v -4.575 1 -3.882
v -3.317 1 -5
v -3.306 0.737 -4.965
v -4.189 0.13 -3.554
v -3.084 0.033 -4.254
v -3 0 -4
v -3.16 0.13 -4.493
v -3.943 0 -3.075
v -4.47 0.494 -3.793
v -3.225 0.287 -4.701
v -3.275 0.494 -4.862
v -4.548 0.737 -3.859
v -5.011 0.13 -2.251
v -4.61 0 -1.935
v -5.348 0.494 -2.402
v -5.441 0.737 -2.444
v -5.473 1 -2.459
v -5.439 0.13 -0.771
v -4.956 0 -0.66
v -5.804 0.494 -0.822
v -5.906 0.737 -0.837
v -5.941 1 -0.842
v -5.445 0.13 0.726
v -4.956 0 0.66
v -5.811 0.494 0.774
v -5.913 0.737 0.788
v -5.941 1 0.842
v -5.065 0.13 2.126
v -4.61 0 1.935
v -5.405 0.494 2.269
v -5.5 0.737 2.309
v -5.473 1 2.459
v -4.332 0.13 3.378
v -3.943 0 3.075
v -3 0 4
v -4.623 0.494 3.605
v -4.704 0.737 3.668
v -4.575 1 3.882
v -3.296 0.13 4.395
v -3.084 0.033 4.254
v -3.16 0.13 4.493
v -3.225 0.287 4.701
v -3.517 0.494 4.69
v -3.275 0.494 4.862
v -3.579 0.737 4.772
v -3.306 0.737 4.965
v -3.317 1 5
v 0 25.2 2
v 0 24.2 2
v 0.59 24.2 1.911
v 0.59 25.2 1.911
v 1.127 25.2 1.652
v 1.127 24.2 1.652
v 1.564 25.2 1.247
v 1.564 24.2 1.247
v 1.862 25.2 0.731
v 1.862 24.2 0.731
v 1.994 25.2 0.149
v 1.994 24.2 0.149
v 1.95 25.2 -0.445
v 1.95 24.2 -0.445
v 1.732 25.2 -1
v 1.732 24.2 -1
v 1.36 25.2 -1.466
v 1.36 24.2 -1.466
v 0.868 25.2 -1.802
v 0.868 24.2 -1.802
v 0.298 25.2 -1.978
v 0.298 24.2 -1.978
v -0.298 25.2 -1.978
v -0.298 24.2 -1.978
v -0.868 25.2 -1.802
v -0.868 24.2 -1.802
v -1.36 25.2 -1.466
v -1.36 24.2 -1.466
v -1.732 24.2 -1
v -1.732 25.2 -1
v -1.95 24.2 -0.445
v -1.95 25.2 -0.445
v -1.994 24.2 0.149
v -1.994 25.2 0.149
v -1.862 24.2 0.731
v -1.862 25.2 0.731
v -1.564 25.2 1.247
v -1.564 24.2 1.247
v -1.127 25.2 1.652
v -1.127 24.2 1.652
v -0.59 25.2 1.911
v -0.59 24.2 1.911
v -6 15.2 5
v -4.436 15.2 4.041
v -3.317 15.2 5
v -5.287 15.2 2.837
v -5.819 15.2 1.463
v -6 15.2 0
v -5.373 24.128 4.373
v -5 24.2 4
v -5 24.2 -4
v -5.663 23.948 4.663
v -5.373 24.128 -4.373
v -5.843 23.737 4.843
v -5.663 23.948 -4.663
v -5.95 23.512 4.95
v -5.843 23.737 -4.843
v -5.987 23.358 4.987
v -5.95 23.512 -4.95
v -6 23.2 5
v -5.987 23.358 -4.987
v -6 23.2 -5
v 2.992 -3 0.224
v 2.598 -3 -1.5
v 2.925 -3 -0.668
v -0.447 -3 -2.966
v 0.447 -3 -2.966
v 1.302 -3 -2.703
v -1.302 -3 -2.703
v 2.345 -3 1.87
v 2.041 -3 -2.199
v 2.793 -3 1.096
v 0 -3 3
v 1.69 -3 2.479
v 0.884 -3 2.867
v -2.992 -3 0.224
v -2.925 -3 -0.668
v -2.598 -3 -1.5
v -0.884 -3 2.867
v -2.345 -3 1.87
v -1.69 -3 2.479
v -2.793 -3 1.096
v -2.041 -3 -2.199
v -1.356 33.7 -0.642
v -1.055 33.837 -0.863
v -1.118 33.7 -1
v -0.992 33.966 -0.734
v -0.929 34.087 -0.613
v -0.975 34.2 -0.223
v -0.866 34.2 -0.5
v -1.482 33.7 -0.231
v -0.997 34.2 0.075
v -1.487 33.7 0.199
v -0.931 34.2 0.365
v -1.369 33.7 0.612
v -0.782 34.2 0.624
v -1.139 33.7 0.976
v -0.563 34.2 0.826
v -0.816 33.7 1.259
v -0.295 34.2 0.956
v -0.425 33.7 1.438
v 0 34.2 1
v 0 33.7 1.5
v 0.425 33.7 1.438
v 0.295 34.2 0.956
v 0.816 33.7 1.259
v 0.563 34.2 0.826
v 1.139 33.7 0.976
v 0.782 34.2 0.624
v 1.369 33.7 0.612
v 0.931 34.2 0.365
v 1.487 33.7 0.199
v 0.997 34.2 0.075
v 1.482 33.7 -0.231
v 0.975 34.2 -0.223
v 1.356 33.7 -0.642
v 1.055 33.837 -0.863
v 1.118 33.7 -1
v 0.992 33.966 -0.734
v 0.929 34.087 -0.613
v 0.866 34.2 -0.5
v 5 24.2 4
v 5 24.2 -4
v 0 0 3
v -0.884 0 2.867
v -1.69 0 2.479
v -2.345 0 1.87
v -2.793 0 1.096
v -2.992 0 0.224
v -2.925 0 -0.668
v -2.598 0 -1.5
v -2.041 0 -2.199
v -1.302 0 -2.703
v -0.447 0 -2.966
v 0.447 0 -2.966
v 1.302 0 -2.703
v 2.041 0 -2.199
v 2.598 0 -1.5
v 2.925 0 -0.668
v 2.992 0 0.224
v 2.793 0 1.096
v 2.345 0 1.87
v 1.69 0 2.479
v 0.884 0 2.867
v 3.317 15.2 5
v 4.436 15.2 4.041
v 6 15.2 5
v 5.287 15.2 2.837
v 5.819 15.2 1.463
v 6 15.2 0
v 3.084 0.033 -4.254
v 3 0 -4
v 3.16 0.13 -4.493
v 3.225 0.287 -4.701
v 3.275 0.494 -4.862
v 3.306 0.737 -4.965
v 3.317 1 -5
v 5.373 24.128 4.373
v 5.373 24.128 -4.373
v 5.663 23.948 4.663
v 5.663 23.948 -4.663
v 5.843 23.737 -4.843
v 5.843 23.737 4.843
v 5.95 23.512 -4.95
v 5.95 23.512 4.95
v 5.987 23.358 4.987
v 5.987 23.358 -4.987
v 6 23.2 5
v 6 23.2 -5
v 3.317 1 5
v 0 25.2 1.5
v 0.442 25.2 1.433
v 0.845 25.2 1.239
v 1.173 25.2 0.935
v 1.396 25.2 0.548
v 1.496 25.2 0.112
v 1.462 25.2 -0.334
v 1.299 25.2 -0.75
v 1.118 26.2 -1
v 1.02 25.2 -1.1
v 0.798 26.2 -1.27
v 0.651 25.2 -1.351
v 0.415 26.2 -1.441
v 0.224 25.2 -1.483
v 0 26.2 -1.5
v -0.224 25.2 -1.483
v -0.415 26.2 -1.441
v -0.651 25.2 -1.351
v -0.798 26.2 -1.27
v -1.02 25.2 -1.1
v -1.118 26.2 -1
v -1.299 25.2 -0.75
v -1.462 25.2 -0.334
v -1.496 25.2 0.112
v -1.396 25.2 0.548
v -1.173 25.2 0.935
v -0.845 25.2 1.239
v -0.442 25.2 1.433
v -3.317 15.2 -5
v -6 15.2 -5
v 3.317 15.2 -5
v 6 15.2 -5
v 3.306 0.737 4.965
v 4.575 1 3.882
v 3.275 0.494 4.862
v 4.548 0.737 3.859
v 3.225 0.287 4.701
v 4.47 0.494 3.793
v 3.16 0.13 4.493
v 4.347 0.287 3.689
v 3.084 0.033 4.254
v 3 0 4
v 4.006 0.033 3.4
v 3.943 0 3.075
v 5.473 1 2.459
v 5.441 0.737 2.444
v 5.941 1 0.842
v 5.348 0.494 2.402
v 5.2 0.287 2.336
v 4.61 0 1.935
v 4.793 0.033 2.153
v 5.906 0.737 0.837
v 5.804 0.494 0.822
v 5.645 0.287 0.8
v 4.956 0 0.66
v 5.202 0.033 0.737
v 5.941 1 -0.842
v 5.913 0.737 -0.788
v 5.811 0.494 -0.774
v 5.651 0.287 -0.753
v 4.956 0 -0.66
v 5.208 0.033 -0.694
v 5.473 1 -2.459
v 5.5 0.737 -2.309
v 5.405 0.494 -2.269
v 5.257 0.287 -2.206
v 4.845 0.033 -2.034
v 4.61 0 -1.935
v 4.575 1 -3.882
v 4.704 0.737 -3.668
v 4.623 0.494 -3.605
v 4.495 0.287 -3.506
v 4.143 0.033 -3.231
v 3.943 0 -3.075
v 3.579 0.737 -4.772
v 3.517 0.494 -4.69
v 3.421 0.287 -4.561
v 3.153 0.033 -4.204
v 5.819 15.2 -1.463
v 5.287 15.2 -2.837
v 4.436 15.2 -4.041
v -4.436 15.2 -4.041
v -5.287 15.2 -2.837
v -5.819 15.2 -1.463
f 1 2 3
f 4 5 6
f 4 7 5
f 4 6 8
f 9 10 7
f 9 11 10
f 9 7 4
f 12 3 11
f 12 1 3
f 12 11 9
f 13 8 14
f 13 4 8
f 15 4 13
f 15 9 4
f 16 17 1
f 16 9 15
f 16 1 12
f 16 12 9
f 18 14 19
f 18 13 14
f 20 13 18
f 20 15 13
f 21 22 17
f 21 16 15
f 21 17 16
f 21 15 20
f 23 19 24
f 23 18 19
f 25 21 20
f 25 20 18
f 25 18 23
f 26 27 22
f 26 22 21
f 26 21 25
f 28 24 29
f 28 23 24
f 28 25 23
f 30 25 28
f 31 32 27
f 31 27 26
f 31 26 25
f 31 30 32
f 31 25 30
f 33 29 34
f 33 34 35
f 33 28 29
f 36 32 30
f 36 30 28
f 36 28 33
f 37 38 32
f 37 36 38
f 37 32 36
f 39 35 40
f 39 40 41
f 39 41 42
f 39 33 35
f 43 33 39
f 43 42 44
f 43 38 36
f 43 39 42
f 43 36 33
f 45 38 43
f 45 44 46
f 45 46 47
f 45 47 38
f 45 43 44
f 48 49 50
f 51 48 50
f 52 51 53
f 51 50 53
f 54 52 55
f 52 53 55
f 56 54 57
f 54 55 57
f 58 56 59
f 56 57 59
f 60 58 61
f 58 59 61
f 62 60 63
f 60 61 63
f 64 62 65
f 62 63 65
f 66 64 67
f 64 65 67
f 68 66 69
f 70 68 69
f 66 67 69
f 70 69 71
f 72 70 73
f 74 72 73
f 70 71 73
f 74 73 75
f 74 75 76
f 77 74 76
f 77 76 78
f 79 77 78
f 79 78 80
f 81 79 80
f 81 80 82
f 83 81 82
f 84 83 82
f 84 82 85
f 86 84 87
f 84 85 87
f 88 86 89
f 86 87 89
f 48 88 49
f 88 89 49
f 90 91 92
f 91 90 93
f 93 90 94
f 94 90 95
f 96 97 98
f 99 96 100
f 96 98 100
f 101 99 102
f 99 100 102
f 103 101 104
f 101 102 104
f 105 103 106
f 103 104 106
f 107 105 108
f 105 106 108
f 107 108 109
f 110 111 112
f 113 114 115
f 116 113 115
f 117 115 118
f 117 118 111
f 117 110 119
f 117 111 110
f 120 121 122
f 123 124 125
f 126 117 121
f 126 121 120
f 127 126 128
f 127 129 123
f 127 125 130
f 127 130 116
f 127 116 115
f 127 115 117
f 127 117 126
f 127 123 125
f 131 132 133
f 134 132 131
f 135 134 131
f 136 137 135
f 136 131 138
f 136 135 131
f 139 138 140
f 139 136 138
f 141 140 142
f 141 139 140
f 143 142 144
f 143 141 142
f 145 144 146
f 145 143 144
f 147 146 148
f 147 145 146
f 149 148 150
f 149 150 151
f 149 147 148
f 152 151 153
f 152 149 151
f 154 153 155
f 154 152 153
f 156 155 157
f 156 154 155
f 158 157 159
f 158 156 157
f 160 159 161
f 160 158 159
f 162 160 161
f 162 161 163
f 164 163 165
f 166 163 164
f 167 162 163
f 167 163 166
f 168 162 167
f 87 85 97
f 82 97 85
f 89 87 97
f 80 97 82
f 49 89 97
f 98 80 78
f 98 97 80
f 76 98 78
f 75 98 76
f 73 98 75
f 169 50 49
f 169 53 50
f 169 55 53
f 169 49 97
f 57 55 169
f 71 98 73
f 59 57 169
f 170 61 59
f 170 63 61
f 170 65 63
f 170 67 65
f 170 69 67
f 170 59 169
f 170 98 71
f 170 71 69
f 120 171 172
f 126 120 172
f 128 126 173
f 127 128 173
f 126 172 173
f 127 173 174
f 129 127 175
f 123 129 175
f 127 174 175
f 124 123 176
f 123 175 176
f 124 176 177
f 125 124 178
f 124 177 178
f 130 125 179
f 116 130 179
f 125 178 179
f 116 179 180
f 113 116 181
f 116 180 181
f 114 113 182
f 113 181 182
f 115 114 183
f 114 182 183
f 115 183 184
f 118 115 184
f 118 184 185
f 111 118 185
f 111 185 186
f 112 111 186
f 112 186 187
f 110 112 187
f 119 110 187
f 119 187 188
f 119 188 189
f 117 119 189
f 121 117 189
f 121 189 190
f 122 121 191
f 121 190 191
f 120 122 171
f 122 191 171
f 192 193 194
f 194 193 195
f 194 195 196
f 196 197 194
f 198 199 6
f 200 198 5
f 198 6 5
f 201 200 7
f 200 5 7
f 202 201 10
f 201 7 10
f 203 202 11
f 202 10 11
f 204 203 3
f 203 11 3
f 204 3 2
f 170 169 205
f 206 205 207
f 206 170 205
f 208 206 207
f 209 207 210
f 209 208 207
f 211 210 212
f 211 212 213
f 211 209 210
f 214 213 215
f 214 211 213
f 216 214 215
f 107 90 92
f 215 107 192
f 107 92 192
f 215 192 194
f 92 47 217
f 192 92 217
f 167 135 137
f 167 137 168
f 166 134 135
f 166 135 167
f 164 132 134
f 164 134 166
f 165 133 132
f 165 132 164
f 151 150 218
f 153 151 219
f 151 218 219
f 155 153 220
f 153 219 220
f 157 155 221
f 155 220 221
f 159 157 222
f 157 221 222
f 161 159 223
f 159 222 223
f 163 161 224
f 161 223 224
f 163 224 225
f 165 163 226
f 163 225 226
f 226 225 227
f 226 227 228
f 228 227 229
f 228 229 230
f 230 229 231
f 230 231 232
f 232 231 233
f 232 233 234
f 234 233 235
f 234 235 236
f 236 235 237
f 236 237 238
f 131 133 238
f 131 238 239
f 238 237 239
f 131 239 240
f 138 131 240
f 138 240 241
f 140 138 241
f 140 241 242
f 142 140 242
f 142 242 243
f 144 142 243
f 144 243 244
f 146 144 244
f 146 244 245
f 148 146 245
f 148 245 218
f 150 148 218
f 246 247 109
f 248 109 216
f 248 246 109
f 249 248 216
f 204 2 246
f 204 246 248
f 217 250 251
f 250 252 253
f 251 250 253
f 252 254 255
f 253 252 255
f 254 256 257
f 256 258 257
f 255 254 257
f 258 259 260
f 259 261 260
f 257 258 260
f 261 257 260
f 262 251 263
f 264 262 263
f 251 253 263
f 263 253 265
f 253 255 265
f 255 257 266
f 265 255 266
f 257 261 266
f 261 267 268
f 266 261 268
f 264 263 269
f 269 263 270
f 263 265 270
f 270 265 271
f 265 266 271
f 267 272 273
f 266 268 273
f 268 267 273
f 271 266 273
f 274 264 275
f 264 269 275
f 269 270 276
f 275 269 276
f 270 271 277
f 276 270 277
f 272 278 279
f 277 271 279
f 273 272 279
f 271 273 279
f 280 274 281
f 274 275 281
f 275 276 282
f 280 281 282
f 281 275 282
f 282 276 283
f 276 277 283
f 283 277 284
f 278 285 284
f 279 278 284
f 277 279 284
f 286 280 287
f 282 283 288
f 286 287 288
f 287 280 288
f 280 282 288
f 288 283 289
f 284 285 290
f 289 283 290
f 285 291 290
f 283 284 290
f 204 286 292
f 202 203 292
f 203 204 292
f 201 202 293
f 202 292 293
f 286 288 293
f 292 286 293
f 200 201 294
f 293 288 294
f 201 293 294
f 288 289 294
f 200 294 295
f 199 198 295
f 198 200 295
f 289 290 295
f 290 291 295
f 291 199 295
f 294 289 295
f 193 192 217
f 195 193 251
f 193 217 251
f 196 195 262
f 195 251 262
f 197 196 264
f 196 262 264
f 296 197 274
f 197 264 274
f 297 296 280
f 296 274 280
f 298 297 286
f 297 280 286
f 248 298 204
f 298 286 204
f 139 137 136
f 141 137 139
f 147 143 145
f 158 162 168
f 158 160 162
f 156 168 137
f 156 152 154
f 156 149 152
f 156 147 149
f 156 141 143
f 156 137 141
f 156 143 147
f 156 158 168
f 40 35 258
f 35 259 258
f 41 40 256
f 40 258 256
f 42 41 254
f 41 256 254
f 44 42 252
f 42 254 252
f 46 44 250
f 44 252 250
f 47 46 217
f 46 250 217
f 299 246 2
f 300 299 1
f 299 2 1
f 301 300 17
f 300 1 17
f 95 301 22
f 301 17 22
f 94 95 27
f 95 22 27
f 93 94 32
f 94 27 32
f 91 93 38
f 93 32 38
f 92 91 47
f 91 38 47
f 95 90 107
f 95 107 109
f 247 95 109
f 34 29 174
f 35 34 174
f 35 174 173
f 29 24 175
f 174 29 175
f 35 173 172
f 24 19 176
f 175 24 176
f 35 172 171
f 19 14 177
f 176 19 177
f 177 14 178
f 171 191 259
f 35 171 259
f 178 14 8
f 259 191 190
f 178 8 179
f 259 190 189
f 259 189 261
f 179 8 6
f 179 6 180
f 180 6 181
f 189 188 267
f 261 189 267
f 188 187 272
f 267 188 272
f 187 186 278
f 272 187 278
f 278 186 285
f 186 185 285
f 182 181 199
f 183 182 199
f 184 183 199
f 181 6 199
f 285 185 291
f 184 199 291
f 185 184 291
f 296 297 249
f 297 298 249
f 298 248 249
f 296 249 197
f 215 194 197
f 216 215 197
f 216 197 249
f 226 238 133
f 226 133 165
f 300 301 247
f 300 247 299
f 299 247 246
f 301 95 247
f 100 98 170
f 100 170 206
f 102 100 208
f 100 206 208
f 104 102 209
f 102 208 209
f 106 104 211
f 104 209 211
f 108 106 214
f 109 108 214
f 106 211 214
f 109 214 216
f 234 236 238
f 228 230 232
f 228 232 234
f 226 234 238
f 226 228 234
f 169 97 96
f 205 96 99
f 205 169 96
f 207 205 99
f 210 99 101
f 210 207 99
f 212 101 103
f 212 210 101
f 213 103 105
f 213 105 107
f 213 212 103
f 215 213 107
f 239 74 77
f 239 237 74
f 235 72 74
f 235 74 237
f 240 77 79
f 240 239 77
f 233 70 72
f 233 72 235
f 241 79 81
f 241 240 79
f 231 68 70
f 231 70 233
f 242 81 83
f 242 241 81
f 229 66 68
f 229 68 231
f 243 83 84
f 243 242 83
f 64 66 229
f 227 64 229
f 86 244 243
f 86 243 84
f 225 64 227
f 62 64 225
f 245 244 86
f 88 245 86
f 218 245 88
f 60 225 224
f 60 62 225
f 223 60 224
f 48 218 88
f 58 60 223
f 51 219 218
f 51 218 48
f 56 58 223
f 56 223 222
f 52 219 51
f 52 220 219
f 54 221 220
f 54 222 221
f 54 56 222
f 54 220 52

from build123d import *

# Parameters (mm, degrees)
EXTRUDE_2_DEPTH     = 15.2
SKETCH_4_W          = 12
SKETCH_4_H          = 10
EXTRUDE_3_DEPTH     = 9
SKETCH_5_R          = 2
EXTRUDE_4_DEPTH     = 1
SKETCH_6_R          = 1.5
EXTRUDE_5_DEPTH     = 9
CUT_EXTRUDE_START   = -8
CUT_EXTRUDE_2_DEPTH = 8
CHAMFER_1_SIZE      = 0.5
FILLET_1_R          = 1
SKETCH_8_R          = 3
EXTRUDE_6_DEPTH     = 3


with BuildPart() as part:
    # Эскиз3 → Бобышка-Вытянуть2 (new body)
    with BuildSketch(Plane(origin=(0, 0, 0), x_dir=(1, 0, 0), z_dir=(0, 1, 0))):
        with BuildLine():
            Line((-3.31662479, -5), (3.31662479, -5))
            ThreePointArc((3.31662479, -5), (6, 0), (3.31662479, 5))
            Line((3.31662479, 5), (-3.31662479, 5))
            ThreePointArc((-3.31662479, 5), (-6, 0), (-3.31662479, -5))
        make_face()
    extrude(amount=EXTRUDE_2_DEPTH)

    # Эскиз4 → Бобышка-Вытянуть3 (add)
    with BuildSketch(Plane(origin=(0, 15.2, 0), x_dir=(1, 0, 0), z_dir=(0, 1, 0))):
        Rectangle(SKETCH_4_W, SKETCH_4_H)
    extrude(amount=EXTRUDE_3_DEPTH)

    # Эскиз5 → Бобышка-Вытянуть4 (add)
    with BuildSketch(Plane(origin=(0, 24.2, 0), x_dir=(1, 0, 0), z_dir=(0, 1, 0))):
        with Locations(Location((0, 0, 0), (0, 0, 270))):
            Circle(SKETCH_5_R)
    extrude(amount=EXTRUDE_4_DEPTH)

    # Эскиз6 → Бобышка-Вытянуть5 (add)
    with BuildSketch(Plane(origin=(0, 25.2, 0), x_dir=(1, 0, 0), z_dir=(0, 1, 0))):
        with Locations(Location((0, 0, 0), (0, 0, 270))):
            Circle(SKETCH_6_R)
    extrude(amount=EXTRUDE_5_DEPTH)

    # Эскиз7 → Вырез-Вытянуть2 (cut)
    with BuildSketch(Plane(origin=(0, 34.2, 0), x_dir=(1, 0, 0), z_dir=(0, 1, 0)).offset(CUT_EXTRUDE_START)):
        with BuildLine():
            Line((-1.118033989, 1), (1.118033989, 1))
            ThreePointArc((1.118033989, 1), (0, 1.5), (-1.118033989, 1))
        make_face()
    extrude(amount=CUT_EXTRUDE_2_DEPTH, mode=Mode.SUBTRACT)

    # Фаска1
    chamfer_1_edges = [part.edges().sort_by_distance(p)[0] for p in [
        (-1.369306394, 34.2, 0.612372436),
        (0, 34.2, -1),
    ]]
    chamfer(chamfer_1_edges, length=CHAMFER_1_SIZE - 0.0001)  # a hair under: the kernel refuses the full size

    # Скругление1
    fillet_1_edges = [part.edges().sort_by_distance(p)[0] for p in [
        (-6, 24.2, 0),
        (0, 24.2, 5),
        (6, 24.2, 0),
        (0, 24.2, -5),
        (0, 0, -5),
        (6, 0, 0),
        (0, 0, 5),
        (-6, 0, 0),
    ]]
    fillet(fillet_1_edges, radius=FILLET_1_R - 0.0001)  # a hair under: the kernel refuses the full size

    # Эскиз8 → Бобышка-Вытянуть6 (add)
    with BuildSketch(Plane.XZ):
        with Locations(Location((0, 0, 0), (0, 0, 90))):
            Circle(SKETCH_8_R)
    extrude(amount=EXTRUDE_6_DEPTH)


solid = part.part
